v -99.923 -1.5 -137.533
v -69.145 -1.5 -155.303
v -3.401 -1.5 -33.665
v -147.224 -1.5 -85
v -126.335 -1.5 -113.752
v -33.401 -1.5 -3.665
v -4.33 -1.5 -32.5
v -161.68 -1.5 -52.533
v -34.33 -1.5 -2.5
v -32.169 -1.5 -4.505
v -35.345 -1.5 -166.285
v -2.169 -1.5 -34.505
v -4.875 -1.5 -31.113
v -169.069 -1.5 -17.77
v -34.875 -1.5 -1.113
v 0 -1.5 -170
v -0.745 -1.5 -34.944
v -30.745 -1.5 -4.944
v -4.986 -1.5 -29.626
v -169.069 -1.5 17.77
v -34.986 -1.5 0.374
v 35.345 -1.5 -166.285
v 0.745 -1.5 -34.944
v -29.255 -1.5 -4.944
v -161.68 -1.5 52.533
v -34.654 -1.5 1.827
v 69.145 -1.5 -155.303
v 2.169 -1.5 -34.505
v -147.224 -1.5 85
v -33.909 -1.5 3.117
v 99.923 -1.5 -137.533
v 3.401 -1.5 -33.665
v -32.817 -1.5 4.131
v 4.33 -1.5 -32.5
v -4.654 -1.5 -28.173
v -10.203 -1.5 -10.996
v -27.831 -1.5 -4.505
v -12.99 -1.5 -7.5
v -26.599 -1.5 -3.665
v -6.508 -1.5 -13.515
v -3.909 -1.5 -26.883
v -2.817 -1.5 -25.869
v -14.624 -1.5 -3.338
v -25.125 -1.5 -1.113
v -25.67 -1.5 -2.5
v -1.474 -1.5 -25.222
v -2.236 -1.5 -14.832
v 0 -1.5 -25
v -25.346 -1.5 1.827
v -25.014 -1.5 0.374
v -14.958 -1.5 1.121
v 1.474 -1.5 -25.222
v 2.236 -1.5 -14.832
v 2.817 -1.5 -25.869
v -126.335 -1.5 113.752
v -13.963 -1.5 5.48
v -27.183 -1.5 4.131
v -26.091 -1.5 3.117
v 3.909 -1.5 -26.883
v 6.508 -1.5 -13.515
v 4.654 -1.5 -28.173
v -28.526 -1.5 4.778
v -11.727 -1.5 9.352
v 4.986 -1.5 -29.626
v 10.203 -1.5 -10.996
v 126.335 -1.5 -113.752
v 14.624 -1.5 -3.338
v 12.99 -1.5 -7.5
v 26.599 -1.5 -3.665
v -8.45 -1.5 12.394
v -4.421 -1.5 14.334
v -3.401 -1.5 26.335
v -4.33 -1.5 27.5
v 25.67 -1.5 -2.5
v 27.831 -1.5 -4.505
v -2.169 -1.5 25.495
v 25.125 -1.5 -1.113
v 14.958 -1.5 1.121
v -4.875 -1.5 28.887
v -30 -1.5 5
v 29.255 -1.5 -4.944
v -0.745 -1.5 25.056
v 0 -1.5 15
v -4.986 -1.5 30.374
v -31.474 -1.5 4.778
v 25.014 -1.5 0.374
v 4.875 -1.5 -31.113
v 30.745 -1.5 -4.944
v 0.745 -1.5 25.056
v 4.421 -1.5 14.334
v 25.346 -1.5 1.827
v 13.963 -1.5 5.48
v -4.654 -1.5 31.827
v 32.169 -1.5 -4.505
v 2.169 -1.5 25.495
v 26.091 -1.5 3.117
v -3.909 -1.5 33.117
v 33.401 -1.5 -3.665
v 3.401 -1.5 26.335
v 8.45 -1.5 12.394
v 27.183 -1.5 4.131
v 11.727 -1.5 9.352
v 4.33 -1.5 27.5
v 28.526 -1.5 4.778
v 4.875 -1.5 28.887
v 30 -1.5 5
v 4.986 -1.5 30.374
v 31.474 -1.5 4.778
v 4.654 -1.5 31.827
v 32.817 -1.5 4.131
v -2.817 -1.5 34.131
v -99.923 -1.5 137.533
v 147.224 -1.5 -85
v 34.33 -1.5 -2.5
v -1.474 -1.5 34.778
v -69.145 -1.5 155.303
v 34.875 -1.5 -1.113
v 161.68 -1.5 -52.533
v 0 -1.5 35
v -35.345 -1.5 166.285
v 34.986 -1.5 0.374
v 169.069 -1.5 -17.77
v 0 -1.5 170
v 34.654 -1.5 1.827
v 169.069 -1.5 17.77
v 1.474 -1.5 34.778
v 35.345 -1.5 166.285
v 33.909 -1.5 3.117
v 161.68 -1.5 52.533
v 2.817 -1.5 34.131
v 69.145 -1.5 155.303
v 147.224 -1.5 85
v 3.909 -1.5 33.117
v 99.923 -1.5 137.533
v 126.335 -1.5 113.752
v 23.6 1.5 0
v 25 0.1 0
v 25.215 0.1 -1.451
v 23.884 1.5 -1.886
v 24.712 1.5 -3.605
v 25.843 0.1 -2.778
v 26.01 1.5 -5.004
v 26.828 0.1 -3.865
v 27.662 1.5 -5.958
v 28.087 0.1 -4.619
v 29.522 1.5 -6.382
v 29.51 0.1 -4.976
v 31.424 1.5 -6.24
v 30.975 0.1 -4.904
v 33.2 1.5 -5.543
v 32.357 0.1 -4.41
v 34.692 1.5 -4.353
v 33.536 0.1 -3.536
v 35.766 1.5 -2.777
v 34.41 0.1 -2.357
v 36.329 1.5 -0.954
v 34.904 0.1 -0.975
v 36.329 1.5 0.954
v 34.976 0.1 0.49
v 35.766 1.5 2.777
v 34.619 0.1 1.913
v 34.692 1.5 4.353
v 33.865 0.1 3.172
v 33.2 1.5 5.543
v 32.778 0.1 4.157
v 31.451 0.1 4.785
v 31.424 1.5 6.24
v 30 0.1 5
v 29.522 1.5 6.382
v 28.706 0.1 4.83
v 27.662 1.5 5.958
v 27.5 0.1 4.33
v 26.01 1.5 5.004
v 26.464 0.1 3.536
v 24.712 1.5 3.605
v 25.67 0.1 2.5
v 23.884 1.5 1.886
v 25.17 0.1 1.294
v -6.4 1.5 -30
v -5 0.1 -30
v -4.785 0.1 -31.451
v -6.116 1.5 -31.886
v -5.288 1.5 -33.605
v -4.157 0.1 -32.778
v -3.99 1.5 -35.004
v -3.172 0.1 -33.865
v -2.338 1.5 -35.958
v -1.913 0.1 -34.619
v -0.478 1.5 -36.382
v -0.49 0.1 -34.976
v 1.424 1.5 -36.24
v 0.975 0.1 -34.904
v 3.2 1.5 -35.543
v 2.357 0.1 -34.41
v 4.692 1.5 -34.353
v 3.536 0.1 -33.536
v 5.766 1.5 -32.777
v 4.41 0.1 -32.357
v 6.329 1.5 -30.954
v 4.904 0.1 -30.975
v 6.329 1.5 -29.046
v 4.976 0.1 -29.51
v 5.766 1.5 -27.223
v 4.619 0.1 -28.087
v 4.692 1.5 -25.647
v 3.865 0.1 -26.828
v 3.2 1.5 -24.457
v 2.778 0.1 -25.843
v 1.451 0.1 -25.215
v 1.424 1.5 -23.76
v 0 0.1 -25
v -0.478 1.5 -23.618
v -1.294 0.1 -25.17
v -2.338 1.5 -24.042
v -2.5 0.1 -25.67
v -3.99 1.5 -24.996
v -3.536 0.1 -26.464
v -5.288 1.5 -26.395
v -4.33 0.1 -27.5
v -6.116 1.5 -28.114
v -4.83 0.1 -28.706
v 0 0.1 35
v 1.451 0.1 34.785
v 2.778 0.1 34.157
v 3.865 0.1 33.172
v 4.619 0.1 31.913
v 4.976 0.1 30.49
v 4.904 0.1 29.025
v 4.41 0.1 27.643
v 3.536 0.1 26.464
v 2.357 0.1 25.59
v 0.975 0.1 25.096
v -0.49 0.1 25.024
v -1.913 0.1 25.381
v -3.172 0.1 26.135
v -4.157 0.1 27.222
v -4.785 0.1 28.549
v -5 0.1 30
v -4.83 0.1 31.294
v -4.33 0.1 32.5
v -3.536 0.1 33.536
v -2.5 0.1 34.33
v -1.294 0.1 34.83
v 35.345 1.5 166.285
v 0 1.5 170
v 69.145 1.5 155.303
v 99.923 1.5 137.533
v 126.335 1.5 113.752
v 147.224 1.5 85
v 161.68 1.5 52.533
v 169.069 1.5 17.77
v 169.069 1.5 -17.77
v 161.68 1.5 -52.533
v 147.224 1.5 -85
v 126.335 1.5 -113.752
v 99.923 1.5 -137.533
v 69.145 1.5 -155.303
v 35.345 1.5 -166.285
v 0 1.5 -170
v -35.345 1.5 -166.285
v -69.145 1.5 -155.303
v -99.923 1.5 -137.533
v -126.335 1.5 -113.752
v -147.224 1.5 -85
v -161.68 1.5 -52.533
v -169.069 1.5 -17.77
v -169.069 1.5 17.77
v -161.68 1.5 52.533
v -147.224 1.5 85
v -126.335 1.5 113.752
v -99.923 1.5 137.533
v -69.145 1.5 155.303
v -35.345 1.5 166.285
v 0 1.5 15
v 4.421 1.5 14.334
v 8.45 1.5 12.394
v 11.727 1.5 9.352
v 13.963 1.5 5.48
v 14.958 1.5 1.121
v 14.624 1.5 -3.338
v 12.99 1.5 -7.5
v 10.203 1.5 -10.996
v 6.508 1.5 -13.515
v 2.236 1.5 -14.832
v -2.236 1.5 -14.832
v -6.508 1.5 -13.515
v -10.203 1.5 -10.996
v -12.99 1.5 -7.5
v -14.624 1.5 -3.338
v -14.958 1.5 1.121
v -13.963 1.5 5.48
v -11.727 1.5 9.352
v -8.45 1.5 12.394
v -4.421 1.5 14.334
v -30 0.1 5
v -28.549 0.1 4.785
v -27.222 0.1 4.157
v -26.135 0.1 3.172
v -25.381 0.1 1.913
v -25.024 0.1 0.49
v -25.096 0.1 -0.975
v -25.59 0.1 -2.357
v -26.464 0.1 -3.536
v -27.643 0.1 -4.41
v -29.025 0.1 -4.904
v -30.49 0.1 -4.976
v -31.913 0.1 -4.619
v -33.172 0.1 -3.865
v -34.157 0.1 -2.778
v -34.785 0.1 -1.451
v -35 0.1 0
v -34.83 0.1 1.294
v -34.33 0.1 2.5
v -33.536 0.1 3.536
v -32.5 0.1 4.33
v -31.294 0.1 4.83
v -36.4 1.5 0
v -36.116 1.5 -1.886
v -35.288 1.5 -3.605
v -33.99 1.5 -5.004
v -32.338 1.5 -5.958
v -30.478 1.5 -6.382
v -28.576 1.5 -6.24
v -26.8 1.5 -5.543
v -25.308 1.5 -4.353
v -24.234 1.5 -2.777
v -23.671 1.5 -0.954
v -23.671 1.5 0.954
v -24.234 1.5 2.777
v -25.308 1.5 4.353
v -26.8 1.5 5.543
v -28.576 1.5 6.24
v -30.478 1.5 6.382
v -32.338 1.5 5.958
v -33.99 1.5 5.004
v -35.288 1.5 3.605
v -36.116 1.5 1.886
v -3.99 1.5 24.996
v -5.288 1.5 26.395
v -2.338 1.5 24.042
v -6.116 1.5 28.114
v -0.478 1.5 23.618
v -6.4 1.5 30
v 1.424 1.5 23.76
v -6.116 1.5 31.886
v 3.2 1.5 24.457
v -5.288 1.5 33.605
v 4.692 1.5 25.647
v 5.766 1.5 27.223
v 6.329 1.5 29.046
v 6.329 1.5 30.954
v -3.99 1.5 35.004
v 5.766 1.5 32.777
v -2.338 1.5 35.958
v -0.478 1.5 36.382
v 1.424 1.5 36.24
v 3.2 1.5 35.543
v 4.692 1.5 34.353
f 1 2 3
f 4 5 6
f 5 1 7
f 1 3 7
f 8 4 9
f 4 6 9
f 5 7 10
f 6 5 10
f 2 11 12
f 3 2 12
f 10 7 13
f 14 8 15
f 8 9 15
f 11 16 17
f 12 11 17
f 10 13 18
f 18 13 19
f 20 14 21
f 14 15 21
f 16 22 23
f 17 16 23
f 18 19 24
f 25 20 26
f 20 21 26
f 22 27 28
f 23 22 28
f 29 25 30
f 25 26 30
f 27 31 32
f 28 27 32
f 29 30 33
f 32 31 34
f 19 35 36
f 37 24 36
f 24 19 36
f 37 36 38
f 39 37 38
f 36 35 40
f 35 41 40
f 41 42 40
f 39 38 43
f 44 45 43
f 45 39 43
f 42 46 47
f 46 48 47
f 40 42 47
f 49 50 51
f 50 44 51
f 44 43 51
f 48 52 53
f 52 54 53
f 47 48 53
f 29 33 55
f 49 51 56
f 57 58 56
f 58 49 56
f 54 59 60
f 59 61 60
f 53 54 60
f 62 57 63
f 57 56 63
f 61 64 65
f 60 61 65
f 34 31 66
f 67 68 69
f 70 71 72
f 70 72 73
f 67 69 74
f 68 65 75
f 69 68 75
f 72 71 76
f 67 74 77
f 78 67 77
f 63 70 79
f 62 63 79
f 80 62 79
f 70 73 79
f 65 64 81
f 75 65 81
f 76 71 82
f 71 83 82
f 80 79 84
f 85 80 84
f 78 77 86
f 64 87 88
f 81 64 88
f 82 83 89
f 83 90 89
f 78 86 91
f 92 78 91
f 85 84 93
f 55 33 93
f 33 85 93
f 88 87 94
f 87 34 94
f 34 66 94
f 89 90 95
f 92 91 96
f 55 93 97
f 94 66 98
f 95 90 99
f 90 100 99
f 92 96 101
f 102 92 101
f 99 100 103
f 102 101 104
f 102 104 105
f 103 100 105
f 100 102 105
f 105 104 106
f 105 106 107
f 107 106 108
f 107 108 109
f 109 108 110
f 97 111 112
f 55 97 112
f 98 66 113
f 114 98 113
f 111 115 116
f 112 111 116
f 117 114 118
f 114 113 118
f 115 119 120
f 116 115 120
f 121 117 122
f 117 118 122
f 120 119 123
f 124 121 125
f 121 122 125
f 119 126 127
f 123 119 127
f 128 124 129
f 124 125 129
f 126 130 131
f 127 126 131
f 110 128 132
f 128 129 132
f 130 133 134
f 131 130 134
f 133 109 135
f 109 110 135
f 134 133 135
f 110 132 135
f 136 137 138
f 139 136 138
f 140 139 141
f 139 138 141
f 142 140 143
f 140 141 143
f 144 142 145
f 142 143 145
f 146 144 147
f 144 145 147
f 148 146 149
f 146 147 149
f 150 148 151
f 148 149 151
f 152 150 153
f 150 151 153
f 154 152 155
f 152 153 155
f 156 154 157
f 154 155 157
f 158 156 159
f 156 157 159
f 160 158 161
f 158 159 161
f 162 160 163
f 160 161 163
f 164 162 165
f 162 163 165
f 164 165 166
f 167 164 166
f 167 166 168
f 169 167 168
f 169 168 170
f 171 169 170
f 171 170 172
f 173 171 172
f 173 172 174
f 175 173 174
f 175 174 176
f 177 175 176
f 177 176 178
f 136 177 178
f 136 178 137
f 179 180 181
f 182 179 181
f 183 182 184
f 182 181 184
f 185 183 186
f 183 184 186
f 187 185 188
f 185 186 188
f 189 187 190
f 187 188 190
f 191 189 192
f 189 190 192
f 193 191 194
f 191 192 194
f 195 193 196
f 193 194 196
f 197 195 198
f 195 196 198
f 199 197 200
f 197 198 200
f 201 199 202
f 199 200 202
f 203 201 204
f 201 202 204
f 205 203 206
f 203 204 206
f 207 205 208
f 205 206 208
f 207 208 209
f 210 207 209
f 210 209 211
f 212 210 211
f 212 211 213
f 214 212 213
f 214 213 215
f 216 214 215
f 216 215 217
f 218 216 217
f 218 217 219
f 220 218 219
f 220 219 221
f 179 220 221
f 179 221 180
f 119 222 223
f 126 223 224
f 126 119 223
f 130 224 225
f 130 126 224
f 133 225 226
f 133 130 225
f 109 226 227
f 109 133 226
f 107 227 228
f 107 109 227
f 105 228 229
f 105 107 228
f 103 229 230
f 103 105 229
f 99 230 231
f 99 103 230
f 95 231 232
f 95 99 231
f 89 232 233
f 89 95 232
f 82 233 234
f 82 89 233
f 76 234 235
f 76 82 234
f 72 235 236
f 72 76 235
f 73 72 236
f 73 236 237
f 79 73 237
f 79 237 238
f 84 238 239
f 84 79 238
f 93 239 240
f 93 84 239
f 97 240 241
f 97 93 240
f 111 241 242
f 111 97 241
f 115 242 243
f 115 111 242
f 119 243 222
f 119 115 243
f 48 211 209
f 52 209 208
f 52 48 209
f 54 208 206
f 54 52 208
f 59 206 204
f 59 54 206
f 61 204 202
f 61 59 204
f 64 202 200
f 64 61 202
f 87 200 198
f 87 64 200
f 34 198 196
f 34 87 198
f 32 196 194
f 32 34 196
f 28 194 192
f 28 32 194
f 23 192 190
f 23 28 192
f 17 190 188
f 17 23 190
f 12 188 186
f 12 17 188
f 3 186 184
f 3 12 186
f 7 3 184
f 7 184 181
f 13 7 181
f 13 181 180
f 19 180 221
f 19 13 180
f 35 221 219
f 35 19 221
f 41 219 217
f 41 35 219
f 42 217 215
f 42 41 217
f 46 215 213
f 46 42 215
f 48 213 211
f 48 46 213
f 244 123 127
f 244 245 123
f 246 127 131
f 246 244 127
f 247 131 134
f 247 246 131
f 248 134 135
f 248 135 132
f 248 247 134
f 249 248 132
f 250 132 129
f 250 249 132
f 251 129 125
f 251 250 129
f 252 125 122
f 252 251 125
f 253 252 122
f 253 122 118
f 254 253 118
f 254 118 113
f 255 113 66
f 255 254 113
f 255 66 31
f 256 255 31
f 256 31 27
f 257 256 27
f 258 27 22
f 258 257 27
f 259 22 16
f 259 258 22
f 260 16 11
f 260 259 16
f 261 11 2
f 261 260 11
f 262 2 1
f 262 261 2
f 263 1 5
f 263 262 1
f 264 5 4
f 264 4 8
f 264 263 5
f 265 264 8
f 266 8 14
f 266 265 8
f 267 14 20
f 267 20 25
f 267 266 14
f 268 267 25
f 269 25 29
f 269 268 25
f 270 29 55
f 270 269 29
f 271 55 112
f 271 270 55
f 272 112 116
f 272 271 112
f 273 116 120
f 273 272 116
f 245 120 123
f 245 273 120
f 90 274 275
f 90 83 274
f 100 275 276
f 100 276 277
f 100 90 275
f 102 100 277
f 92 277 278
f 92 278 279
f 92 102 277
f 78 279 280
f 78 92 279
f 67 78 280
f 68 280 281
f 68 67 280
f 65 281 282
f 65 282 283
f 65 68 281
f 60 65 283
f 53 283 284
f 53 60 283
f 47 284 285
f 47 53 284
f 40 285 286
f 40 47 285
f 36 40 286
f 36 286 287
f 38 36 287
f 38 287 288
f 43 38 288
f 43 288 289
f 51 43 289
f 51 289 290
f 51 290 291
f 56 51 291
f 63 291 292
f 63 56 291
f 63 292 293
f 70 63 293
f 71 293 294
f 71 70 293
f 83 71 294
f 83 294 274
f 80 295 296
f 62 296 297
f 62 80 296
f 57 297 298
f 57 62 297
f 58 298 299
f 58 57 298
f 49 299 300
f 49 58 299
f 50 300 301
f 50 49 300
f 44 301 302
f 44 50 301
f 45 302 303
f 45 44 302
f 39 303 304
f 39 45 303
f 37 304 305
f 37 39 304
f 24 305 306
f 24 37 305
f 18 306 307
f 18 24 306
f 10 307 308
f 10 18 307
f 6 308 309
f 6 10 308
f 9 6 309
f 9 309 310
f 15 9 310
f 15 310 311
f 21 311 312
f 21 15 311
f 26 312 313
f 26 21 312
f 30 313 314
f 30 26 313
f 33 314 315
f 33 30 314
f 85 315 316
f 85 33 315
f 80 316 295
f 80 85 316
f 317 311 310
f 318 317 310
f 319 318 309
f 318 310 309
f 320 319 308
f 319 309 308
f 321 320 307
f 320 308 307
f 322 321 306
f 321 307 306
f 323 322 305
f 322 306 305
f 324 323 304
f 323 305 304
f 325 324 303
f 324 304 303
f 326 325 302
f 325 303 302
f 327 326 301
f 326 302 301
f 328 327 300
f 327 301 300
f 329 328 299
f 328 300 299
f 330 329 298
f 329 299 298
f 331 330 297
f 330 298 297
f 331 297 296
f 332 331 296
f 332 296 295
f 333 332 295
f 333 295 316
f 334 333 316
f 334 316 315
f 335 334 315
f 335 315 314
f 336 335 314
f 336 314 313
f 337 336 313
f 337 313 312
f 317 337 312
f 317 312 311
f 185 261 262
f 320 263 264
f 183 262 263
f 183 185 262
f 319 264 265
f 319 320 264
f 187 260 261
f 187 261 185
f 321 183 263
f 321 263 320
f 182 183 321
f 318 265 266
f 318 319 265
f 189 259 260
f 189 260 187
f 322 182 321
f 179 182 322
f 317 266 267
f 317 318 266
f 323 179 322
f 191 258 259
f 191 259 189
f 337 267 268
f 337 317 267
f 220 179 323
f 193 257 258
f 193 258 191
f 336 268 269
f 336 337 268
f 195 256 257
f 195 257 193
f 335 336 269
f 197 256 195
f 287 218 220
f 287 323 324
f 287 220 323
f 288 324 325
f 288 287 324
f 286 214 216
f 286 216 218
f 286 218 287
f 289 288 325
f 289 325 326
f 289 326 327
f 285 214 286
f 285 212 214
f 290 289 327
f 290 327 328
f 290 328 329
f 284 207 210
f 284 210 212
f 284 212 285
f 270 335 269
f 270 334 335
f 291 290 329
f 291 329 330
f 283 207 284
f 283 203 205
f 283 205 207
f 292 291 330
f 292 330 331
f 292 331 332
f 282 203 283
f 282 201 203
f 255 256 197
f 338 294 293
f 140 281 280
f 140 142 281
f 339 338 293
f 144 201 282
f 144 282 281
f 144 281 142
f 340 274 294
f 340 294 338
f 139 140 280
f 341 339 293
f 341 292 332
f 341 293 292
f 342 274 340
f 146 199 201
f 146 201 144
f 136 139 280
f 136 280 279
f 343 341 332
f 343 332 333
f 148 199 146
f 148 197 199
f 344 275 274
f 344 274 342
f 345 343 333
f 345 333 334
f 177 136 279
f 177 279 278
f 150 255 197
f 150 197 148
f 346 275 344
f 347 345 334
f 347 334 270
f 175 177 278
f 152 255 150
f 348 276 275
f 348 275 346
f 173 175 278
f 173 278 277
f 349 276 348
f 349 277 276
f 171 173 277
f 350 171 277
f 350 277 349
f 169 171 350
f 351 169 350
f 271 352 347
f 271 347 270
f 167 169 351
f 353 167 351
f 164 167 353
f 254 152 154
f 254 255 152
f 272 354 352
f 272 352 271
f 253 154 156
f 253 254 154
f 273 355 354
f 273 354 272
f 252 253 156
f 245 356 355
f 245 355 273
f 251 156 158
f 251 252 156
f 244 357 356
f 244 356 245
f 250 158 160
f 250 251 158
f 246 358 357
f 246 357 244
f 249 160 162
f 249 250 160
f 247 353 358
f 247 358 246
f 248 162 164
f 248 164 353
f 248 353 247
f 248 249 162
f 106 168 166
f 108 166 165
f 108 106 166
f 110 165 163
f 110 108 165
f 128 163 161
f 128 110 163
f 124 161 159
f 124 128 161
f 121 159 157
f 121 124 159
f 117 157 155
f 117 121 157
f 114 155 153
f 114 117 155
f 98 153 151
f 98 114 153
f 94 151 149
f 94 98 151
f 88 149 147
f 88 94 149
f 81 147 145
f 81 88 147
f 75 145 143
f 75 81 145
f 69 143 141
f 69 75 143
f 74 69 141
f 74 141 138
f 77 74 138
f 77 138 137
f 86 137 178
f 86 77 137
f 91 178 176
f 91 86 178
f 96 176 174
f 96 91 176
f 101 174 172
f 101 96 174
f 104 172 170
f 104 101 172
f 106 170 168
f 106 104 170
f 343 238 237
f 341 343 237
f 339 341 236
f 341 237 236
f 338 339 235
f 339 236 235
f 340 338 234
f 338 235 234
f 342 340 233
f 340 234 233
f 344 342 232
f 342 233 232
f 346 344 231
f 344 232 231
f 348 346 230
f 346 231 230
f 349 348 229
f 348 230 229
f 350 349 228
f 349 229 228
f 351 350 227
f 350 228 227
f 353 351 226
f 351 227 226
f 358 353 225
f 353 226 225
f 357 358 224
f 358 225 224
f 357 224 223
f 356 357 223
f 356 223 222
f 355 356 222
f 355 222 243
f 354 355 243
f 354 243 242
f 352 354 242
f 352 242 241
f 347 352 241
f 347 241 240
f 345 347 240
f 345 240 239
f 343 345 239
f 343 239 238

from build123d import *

# Parameters (mm, degrees)
SKETCH_1_R       = 170
SKETCH_1_R_2     = 15
SKETCH_1_R_3     = 5
EXTRUDE_1_DEPTH  = 1.5
MM_2_D           = 1
MM_2_DEPTH       = 12.4
MM_2_CSINK_D     = 12.8
MM_2_CSINK_ANGLE = 90
MM_2_TIP         = 0.30043031


with BuildPart() as part:
    # 草图1 → 凸台-拉伸1 (new, symmetric)
    with BuildSketch(Plane(origin=(0, 0, 0), x_dir=(1, 0, 0), z_dir=(0, 1, 0))):
        with Locations(Location((0, 0, 0), (0, 0, 270))):
            Circle(SKETCH_1_R)
        with Locations(Location((0, 0, 0), (0, 0, 270))):
            Circle(SKETCH_1_R_2, mode=Mode.SUBTRACT)
        with Locations(Location((-30, 0, 0), (0, 0, 270))):
            Circle(SKETCH_1_R_3, mode=Mode.SUBTRACT)
        with Locations(Location((0, 30, 0), (0, 0, 270))):
            Circle(SKETCH_1_R_3, mode=Mode.SUBTRACT)
        with Locations(Location((30, 0, 0), (0, 0, 270))):
            Circle(SKETCH_1_R_3, mode=Mode.SUBTRACT)
        with Locations(Location((0, -30, 0), (0, 0, 270))):
            Circle(SKETCH_1_R_3, mode=Mode.SUBTRACT)
    extrude(amount=EXTRUDE_1_DEPTH, both=True)

    # 大小mm 暗销孔2
    with Locations(Plane(origin=(0, 1.5, 0), x_dir=(1, 0, 0), z_dir=(0, 1, 0))):
        with Locations((-30, 0), (0, 30), (30, 0), (0, -30)):
            CounterSinkHole(MM_2_D / 2, MM_2_CSINK_D / 2, depth=MM_2_DEPTH, counter_sink_angle=MM_2_CSINK_ANGLE)
            with Locations((0, 0, -(MM_2_DEPTH + MM_2_TIP / 2))):  # 118° drill point
                Cone(0, MM_2_D / 2, MM_2_TIP, mode=Mode.SUBTRACT)


solid = part.part
